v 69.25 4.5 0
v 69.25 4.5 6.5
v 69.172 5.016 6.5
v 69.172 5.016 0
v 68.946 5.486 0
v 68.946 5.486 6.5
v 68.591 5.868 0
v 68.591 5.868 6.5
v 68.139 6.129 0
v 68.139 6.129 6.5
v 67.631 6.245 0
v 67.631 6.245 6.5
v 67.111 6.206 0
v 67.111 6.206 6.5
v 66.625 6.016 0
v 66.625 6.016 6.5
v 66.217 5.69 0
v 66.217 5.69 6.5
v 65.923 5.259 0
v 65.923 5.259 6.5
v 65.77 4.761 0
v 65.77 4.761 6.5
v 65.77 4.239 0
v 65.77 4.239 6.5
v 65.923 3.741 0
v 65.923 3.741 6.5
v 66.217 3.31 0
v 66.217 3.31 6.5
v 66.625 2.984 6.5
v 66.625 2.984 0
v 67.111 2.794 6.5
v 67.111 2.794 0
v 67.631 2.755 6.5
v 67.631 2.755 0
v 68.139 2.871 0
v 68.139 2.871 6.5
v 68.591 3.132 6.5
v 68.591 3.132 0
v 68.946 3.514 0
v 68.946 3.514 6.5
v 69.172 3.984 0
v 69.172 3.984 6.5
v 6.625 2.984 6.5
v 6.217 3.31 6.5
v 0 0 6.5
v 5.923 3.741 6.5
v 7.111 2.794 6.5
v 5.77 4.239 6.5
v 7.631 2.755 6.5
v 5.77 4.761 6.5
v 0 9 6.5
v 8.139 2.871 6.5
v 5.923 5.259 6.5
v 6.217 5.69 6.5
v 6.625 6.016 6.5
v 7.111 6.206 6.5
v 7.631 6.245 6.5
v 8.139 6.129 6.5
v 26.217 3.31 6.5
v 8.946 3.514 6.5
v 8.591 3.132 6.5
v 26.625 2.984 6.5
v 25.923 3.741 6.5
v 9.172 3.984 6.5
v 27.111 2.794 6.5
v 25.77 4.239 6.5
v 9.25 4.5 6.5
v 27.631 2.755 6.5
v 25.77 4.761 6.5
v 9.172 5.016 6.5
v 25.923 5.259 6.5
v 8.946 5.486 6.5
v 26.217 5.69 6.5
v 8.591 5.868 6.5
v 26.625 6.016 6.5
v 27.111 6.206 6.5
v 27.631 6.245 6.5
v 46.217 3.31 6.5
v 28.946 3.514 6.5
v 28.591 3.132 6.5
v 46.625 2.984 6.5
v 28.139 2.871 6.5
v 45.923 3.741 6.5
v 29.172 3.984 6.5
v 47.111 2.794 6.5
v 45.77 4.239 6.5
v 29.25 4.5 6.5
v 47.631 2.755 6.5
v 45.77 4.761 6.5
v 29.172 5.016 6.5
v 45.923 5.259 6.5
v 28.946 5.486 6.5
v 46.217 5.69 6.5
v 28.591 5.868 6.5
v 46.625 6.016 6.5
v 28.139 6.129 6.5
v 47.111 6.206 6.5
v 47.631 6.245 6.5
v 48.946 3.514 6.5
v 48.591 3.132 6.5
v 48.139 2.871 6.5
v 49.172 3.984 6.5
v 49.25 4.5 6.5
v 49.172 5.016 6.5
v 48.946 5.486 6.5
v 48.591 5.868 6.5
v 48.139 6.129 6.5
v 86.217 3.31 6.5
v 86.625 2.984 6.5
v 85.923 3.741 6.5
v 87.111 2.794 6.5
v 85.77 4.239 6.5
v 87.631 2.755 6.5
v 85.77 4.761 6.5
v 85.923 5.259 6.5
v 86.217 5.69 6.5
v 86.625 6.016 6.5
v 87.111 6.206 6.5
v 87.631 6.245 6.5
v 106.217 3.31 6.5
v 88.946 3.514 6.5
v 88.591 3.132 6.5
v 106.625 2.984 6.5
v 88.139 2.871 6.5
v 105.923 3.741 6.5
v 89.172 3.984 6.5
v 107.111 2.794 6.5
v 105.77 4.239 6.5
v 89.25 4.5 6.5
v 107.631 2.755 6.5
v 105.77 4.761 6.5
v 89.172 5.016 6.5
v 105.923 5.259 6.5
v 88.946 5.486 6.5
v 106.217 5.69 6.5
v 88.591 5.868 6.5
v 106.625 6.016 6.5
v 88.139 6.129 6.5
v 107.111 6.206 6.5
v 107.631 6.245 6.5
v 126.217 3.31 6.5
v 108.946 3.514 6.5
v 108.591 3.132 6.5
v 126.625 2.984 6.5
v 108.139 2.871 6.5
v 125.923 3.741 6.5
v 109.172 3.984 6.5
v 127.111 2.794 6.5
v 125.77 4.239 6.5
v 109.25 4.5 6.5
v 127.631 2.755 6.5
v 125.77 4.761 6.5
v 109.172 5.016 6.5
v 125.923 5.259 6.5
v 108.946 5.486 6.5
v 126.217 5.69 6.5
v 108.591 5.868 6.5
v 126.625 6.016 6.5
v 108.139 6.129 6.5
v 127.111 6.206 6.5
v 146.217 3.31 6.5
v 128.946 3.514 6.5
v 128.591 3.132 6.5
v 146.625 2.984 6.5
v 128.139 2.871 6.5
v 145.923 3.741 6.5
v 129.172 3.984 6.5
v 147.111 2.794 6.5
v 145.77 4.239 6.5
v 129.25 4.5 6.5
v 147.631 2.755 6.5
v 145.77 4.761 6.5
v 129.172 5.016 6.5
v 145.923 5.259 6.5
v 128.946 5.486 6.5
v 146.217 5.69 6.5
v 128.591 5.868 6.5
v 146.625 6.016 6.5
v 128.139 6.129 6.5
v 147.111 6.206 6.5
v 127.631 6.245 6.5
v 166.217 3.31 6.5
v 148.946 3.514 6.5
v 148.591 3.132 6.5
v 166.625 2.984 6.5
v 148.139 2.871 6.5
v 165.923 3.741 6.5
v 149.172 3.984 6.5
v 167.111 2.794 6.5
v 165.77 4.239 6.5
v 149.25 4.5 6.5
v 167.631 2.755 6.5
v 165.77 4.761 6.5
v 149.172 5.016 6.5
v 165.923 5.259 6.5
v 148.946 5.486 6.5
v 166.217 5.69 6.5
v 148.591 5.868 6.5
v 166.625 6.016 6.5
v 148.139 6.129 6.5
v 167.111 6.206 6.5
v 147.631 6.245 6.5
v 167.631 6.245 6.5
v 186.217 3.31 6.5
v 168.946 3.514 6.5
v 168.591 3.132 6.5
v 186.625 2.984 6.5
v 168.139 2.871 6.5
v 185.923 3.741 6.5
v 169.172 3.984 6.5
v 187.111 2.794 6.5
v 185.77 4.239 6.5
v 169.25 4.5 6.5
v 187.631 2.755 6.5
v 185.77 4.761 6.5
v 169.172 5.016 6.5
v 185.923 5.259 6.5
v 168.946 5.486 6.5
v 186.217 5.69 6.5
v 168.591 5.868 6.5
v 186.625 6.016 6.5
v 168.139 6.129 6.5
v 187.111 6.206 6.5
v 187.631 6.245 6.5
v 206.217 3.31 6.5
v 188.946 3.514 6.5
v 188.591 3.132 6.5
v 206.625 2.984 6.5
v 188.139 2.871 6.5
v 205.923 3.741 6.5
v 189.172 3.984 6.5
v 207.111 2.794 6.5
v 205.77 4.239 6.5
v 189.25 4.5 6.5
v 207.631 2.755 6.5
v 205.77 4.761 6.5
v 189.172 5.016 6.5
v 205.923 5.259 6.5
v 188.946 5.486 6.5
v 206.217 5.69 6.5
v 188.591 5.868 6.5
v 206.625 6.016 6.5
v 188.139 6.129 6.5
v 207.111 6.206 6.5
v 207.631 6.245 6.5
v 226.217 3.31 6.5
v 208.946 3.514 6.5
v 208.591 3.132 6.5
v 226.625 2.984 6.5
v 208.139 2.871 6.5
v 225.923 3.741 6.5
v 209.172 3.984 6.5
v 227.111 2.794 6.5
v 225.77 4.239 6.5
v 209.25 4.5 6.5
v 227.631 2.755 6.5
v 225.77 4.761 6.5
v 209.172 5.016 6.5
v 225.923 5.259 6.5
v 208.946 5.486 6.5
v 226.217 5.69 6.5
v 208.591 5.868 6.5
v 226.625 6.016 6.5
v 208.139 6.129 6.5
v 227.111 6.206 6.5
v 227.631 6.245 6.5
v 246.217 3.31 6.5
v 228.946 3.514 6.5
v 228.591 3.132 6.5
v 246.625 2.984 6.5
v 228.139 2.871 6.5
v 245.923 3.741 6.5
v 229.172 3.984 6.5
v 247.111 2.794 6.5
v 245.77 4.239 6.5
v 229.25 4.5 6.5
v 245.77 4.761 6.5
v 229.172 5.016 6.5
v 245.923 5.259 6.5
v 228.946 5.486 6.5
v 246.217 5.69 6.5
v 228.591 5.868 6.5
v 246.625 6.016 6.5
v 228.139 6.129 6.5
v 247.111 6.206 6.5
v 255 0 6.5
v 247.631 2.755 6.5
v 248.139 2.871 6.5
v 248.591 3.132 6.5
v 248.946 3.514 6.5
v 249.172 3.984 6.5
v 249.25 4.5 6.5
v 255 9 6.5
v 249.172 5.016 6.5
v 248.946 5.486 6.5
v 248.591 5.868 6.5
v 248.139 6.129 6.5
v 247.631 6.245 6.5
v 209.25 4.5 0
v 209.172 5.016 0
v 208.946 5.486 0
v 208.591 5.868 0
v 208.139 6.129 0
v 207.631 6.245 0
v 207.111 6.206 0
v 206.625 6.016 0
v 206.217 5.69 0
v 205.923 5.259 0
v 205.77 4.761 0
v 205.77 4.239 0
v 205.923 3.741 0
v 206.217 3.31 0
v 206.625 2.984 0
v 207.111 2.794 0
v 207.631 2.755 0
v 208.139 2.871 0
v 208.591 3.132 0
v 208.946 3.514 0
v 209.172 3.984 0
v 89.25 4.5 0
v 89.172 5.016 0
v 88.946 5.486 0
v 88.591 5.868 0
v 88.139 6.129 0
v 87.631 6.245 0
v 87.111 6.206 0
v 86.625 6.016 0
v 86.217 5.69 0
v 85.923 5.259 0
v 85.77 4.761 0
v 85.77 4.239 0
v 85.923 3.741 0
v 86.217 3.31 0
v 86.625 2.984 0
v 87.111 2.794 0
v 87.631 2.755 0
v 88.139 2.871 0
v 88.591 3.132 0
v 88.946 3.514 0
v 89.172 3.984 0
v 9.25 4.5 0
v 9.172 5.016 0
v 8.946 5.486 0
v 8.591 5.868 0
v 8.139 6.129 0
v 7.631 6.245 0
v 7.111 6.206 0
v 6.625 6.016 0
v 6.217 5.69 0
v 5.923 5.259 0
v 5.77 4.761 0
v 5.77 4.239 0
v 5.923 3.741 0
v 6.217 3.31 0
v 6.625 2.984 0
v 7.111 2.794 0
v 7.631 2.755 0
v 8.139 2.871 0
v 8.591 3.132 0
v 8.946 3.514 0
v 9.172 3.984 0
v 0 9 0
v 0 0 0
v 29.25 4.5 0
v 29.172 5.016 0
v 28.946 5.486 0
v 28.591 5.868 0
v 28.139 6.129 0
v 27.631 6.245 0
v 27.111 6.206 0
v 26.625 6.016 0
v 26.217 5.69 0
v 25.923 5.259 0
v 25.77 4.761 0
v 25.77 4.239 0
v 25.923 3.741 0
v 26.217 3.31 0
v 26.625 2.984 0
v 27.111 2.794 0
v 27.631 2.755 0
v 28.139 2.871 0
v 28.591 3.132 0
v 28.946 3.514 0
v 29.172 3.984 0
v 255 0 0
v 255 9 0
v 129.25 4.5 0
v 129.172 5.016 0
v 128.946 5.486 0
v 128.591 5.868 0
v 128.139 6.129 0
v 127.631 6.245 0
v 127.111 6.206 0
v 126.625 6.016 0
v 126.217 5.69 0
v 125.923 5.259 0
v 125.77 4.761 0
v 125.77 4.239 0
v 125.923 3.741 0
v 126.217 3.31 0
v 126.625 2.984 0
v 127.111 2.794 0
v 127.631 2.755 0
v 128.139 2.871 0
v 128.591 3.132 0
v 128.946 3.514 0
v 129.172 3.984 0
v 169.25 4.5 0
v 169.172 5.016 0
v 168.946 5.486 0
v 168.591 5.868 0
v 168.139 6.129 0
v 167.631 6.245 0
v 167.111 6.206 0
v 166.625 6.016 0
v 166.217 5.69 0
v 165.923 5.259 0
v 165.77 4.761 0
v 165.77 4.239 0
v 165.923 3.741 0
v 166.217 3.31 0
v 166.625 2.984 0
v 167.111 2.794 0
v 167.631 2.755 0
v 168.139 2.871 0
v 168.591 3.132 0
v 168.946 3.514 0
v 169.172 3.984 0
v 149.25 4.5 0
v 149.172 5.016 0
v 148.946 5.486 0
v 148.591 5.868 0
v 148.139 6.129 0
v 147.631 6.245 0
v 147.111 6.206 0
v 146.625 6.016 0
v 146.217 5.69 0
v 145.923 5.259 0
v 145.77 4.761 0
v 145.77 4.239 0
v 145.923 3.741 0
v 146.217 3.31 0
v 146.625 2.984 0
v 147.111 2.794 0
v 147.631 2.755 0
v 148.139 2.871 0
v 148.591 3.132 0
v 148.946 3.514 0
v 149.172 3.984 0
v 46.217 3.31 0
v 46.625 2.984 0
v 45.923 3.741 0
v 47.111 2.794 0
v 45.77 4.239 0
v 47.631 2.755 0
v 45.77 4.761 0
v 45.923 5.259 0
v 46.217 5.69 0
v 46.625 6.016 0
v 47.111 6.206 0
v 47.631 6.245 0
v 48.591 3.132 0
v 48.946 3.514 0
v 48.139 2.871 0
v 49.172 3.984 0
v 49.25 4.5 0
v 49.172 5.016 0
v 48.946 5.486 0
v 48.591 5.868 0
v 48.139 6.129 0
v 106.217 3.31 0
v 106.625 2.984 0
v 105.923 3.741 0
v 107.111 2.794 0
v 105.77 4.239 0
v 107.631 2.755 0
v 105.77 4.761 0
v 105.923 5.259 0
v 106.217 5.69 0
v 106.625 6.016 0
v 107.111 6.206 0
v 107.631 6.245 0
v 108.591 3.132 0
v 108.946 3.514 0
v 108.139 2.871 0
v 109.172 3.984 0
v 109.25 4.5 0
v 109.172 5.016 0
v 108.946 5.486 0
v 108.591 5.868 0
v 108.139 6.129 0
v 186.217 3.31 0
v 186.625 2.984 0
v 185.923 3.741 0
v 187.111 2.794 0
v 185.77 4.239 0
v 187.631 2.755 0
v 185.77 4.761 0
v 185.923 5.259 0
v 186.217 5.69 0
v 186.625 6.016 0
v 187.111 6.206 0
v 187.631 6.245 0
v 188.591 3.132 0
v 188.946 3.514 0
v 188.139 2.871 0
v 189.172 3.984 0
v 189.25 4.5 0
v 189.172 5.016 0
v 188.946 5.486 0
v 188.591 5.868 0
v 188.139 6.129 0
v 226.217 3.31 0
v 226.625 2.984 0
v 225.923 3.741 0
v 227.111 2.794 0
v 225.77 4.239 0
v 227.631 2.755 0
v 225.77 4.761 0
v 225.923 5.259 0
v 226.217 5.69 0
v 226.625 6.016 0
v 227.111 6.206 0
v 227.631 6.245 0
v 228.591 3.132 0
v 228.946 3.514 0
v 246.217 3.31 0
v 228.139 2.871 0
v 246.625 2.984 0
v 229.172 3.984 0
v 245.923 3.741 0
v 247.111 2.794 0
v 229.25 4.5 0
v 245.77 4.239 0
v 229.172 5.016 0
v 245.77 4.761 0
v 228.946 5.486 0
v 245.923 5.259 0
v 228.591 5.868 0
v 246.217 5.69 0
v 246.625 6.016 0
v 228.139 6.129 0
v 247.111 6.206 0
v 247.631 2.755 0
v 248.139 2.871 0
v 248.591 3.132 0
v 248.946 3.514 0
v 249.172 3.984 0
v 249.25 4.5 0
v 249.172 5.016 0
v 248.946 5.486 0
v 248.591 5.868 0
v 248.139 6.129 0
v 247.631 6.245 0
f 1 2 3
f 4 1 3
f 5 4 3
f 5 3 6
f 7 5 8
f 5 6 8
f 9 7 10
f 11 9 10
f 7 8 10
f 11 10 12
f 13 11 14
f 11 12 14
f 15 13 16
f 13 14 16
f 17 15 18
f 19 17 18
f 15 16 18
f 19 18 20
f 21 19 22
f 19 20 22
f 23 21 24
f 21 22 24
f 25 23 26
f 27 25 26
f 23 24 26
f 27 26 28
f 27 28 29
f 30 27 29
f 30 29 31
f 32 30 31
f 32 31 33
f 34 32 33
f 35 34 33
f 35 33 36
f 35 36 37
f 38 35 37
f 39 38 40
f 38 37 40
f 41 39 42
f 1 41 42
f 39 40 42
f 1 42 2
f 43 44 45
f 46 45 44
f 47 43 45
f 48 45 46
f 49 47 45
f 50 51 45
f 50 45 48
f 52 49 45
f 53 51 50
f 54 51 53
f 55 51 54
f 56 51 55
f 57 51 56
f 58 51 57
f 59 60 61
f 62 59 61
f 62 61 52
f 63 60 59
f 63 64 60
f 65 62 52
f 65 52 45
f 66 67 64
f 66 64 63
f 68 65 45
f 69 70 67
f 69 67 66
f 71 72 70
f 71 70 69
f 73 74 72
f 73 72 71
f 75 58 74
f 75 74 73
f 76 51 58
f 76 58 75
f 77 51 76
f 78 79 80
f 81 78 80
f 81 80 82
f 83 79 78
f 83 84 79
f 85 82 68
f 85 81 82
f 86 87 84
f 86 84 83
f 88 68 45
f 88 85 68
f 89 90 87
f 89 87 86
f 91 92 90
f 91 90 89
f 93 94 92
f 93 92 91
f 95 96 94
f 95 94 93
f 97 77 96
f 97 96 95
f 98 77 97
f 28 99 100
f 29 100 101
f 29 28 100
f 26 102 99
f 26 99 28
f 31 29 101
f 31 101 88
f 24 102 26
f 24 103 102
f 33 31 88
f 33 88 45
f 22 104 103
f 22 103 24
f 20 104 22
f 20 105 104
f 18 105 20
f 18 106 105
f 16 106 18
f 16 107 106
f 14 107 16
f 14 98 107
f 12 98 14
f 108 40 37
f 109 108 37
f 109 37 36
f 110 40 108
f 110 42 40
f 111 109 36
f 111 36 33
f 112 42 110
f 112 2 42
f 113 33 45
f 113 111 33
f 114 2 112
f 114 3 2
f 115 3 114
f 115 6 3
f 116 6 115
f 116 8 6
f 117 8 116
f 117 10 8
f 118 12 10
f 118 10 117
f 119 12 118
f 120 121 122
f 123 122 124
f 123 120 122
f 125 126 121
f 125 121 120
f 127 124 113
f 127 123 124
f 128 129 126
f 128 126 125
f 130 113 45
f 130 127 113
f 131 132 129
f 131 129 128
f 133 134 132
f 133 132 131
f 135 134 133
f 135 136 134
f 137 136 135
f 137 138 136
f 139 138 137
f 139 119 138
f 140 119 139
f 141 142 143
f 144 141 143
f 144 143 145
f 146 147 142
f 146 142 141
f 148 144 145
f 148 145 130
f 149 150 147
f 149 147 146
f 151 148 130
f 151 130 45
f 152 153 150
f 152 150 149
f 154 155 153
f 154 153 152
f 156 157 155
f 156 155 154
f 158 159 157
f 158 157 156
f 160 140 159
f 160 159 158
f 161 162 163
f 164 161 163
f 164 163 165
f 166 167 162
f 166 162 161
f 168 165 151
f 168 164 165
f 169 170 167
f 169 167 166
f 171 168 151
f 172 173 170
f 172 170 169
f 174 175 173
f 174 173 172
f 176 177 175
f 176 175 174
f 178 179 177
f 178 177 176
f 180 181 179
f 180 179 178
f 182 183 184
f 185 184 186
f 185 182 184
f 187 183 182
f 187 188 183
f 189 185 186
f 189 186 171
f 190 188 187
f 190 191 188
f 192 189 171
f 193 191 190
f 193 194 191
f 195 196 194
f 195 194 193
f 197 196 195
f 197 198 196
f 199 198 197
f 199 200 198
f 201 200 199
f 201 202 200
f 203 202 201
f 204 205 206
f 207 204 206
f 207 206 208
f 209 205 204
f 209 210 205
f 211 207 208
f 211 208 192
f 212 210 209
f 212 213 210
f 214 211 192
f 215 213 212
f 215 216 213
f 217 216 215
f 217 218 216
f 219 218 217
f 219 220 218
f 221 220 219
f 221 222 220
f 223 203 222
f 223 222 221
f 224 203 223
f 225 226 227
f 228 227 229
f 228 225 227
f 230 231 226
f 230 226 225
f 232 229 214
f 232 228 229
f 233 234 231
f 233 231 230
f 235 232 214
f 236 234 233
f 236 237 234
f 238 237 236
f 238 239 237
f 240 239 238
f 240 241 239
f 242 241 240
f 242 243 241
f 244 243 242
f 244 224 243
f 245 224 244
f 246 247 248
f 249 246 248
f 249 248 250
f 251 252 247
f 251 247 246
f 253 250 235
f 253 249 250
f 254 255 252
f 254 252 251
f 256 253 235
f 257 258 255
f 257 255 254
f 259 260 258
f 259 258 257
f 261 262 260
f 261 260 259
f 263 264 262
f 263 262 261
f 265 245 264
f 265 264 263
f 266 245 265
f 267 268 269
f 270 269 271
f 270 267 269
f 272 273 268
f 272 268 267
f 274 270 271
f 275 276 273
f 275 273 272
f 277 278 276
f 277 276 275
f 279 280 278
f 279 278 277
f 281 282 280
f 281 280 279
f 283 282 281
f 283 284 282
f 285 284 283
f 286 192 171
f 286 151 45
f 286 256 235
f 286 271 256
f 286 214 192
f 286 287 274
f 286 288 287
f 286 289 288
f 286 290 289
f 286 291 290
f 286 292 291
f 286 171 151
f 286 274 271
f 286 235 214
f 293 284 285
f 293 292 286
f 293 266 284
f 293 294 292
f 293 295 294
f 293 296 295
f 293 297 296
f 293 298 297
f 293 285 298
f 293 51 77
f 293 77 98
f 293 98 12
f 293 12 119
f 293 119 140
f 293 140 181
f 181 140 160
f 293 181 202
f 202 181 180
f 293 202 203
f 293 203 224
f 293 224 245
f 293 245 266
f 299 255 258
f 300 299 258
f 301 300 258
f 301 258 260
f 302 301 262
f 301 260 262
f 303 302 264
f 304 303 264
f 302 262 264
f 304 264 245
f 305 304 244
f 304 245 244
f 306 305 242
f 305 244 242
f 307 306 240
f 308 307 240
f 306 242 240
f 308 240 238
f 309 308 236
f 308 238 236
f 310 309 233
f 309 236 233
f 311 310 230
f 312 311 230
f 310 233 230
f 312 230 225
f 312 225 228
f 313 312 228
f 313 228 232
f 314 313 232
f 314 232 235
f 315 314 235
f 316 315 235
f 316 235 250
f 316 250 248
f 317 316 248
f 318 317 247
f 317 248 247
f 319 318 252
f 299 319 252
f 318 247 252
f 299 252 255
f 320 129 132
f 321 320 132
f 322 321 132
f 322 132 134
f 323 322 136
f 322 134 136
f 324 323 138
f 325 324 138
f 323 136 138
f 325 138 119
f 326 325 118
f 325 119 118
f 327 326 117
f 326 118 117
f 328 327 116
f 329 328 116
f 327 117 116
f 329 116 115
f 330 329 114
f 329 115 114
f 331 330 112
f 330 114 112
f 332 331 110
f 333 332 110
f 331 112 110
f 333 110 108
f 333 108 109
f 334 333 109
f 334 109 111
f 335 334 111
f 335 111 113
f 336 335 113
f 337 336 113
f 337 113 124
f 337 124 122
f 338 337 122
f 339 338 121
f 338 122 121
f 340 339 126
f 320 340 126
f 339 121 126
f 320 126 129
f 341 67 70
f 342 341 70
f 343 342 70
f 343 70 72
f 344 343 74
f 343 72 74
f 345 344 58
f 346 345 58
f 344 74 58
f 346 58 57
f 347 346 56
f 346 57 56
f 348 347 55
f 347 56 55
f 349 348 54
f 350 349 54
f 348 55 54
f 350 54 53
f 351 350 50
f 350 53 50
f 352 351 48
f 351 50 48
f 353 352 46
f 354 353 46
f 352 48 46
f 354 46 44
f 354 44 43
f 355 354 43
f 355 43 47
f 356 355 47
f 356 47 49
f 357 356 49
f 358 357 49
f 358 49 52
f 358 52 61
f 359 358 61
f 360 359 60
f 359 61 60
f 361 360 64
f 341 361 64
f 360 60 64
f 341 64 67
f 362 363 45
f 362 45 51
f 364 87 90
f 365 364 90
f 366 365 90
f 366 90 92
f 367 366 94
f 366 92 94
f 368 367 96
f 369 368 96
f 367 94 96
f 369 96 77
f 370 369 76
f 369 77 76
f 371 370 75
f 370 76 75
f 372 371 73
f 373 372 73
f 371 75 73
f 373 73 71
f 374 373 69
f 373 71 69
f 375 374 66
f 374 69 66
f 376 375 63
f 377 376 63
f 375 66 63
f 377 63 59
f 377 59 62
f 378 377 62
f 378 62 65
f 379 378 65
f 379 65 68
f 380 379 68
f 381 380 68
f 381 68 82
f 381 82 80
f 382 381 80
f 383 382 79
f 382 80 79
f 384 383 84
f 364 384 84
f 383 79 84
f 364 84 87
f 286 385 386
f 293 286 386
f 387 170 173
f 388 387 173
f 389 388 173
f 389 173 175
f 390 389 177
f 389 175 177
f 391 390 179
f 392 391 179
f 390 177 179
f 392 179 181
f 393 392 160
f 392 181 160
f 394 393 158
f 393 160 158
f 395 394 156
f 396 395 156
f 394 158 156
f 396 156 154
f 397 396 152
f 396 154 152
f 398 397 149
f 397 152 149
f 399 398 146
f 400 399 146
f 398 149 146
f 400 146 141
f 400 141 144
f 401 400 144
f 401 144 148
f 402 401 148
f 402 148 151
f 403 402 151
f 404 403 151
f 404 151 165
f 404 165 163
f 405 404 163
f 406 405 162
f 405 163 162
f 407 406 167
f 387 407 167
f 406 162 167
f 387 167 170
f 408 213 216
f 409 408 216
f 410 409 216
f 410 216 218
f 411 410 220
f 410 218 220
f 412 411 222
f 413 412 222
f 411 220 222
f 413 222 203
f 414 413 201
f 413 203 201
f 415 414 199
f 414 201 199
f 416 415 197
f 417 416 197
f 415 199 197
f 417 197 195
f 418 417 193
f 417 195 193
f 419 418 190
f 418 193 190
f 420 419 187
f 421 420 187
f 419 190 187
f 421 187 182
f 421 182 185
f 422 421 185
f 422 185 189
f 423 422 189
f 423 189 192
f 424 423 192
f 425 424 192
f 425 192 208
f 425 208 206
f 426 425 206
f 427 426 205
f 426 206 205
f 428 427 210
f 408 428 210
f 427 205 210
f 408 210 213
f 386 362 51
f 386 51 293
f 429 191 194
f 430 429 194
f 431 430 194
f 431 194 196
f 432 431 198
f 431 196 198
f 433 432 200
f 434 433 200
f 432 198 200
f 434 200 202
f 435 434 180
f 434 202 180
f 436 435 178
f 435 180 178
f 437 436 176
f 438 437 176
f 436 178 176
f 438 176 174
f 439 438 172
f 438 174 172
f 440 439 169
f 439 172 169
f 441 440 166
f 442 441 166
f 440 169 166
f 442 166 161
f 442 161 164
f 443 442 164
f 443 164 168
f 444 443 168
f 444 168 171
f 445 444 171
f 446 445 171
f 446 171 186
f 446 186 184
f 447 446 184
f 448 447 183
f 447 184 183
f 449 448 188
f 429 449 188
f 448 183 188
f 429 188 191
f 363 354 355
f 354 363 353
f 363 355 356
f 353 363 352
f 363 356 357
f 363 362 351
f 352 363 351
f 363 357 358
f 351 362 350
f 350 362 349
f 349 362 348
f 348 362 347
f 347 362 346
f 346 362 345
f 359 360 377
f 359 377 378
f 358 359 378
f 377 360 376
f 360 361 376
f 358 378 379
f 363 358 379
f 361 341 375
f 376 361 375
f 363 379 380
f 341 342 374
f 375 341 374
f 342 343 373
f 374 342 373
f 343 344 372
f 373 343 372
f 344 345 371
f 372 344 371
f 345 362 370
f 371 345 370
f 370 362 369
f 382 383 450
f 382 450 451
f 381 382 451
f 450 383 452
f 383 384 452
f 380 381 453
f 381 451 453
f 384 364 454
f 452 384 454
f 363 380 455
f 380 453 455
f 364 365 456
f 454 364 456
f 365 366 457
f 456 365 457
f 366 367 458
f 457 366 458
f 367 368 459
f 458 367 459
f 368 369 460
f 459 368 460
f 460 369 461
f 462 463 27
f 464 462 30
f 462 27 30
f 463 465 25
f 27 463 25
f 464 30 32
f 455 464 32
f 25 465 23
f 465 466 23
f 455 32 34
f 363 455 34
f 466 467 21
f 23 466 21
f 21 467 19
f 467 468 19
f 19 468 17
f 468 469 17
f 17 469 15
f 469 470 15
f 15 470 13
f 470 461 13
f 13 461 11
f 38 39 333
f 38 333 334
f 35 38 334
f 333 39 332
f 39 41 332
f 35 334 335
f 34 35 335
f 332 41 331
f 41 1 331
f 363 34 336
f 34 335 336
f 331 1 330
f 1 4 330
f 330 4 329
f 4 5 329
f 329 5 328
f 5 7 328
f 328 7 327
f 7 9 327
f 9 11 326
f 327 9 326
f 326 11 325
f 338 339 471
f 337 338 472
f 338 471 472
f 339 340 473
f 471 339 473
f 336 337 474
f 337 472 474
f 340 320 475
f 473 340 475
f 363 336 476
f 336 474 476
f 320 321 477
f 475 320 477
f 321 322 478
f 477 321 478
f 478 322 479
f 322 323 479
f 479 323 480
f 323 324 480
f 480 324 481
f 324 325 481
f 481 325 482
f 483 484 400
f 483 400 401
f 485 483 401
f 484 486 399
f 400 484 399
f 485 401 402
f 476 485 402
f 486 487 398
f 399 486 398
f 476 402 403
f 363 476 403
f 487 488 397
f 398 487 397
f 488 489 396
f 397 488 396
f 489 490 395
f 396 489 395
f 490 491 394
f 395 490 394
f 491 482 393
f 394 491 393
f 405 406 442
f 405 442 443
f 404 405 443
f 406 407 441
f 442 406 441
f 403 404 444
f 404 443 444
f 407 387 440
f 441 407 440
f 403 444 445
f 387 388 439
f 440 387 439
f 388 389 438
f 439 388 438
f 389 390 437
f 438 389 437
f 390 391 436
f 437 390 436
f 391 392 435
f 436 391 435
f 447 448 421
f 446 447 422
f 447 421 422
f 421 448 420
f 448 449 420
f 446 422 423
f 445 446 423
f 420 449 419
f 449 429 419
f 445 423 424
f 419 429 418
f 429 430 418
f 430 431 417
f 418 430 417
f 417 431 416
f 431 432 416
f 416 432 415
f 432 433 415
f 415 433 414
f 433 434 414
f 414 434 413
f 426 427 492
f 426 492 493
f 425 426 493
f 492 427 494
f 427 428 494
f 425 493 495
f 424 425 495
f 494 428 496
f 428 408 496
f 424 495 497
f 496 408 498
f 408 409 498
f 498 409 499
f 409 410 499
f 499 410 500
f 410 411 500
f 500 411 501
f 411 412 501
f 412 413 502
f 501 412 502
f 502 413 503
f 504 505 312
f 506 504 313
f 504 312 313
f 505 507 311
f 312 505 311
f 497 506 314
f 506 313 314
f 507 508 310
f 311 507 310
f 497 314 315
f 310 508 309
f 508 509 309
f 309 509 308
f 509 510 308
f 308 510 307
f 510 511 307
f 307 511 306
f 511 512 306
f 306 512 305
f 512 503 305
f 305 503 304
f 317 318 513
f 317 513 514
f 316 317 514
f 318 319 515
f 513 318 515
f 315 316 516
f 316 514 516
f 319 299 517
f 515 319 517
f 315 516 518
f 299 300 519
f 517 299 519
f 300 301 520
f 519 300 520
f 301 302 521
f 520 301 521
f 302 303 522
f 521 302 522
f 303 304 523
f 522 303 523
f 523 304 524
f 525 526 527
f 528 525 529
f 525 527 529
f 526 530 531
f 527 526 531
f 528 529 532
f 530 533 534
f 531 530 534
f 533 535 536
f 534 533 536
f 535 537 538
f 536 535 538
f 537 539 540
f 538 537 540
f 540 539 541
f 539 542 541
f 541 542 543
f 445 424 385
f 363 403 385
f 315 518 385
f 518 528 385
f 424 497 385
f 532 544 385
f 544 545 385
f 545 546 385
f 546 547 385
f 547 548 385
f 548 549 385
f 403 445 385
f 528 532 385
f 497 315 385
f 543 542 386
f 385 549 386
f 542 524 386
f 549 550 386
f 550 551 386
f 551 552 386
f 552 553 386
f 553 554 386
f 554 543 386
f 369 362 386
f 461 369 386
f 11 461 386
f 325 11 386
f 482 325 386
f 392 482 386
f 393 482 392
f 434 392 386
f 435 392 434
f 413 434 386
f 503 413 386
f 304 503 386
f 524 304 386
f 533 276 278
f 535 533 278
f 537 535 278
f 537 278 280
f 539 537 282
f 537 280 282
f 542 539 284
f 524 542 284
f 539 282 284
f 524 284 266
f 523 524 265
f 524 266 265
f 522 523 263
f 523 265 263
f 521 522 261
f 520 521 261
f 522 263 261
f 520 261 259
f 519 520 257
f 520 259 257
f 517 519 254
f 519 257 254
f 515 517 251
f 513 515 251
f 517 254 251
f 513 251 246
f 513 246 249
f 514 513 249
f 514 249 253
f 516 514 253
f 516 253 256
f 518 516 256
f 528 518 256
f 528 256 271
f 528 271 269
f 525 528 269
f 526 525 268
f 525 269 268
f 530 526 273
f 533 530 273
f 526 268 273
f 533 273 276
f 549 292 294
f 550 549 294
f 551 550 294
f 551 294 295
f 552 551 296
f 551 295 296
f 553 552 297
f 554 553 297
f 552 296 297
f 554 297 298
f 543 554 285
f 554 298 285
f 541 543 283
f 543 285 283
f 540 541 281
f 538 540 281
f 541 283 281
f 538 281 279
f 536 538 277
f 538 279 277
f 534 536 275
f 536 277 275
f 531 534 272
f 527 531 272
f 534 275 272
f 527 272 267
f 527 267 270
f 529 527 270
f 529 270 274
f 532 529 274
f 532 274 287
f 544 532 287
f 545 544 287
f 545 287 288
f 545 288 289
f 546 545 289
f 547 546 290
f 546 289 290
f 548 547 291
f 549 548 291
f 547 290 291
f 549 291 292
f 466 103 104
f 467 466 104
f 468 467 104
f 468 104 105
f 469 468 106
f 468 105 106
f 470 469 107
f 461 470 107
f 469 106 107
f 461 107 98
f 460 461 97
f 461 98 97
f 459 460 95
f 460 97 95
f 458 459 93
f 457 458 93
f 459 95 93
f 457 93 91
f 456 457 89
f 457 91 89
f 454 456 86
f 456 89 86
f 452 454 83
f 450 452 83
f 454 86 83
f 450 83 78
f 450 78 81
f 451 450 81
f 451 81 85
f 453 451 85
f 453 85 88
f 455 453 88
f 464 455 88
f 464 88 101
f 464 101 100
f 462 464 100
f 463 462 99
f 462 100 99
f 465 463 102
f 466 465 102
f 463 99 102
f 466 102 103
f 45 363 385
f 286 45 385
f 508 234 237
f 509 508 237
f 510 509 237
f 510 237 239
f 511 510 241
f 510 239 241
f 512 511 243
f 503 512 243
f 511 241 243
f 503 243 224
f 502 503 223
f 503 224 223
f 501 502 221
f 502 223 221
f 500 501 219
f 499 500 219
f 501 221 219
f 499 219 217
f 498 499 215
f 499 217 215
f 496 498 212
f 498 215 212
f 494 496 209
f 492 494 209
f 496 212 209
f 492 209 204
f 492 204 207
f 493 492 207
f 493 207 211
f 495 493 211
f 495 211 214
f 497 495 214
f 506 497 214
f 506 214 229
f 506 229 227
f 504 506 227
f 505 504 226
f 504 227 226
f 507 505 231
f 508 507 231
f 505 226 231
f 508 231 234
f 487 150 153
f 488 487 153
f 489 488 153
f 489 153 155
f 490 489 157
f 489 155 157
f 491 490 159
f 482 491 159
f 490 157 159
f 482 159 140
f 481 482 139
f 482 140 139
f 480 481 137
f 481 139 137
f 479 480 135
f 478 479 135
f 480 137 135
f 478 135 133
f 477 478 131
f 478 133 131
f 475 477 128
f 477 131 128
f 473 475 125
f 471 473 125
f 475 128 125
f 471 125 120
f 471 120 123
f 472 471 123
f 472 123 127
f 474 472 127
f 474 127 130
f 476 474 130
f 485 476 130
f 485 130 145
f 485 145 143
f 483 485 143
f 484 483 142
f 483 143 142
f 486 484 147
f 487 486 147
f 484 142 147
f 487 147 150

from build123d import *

# Parameters (mm, degrees)
SKETCH_W            = 255
SKETCH_H            = 9
PAD_DEPTH           = 6.5
SKETCH001_R         = 1.75
POCKET_DEPTH        = 6.5
LINEARPATTERN_COUNT = 13
LINEARPATTERN_PITCH = 20


with BuildPart() as part:
    # Sketch → Pad (new body)
    with BuildSketch(Plane.XY):
        with Locations((127.5, 4.5)):
            Rectangle(SKETCH_W, SKETCH_H)
    extrude(amount=PAD_DEPTH)

    # Sketch001 (on Face6 of Pad) → Pocket (cut)
    with BuildSketch(Plane.XY.offset(6.5)):
        with Locations((7.5, 4.5)):
            Circle(SKETCH001_R)
    pocket = extrude(amount=-POCKET_DEPTH, mode=Mode.SUBTRACT)

    # LinearPattern: Pocket ×13
    with Locations(*[(i * LINEARPATTERN_PITCH, 0, 0) for i in range(1, LINEARPATTERN_COUNT)]):
        add(pocket, mode=Mode.SUBTRACT)


solid = part.part
